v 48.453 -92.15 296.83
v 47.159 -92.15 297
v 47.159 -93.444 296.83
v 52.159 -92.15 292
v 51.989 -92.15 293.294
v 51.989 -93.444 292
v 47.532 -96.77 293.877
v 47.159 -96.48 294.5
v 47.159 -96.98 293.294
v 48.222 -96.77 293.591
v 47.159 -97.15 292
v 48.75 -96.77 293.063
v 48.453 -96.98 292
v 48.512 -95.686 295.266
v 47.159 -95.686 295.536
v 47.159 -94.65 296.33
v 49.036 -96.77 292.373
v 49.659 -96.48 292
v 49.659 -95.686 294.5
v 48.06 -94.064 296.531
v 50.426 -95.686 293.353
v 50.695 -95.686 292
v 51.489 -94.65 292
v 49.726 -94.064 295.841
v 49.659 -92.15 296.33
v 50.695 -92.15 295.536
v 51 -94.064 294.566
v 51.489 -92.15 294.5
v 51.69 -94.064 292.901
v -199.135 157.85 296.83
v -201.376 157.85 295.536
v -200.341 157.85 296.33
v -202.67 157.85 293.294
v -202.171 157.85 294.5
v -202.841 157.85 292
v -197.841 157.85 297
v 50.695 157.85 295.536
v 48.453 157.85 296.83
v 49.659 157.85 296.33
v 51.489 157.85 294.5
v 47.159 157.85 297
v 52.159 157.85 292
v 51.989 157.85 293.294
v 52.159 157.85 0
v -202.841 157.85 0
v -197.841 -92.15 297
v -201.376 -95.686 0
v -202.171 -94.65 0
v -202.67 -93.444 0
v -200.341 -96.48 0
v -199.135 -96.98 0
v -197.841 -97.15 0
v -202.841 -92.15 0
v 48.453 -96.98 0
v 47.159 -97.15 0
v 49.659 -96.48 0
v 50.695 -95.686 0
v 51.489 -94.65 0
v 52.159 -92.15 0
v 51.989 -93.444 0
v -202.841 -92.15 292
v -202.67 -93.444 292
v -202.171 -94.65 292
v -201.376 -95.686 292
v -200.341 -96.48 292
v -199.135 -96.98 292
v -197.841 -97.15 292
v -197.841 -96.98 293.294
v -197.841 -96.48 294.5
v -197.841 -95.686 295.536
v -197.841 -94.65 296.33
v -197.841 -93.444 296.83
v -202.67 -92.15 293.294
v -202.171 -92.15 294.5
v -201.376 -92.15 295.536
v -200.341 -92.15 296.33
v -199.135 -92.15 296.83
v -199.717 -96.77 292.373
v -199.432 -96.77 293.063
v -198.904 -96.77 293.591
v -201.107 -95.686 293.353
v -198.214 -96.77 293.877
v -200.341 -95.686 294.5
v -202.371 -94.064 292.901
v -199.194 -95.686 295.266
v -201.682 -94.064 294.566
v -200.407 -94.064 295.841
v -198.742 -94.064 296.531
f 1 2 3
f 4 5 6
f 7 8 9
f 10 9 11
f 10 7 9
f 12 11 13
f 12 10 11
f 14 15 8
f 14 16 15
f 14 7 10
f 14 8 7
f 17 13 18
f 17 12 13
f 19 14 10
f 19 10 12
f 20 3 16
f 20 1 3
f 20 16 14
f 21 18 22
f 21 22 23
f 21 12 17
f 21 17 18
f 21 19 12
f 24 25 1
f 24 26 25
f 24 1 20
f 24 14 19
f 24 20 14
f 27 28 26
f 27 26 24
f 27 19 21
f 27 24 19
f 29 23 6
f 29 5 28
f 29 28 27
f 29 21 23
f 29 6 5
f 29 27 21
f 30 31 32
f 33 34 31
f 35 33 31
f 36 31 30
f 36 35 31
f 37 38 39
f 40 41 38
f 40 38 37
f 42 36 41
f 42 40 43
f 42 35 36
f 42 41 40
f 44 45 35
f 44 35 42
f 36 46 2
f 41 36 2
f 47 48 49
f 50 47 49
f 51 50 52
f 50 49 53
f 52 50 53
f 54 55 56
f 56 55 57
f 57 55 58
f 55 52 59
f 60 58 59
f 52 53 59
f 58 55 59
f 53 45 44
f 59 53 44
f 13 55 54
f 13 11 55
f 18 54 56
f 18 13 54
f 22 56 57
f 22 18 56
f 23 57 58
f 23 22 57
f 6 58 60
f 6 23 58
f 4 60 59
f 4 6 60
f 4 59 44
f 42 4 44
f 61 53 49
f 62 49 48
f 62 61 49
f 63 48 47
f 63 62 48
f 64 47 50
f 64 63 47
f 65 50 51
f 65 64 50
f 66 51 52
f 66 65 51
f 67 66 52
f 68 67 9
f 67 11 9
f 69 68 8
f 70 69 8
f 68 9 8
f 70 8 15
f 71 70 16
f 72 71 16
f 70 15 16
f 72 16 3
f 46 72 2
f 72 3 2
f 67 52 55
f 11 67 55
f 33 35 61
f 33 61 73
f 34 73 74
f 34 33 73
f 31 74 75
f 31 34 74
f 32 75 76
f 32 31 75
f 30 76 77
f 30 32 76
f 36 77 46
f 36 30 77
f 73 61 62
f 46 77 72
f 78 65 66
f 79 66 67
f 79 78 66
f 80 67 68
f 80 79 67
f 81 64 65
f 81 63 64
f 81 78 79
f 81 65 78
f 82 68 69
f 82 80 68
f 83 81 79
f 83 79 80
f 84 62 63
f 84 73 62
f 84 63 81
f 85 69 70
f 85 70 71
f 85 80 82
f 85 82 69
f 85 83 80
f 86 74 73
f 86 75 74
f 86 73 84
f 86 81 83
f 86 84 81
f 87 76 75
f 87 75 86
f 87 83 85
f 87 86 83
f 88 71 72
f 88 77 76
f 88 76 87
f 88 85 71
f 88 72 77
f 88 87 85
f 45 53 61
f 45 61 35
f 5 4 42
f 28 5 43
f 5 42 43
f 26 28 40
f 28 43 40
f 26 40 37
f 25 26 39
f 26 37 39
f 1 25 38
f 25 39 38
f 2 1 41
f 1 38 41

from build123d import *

# Parameters (mm, degrees)
F0_W     = 255
F0_H     = 255
F1_DEPTH = 297
F2_R     = 5


with BuildPart() as f1:
    # F0 (on Top) → F1 (new body)
    with BuildSketch(Plane.XY):
        with Locations((-75.340826, 30.349805)):
            Rectangle(F0_W, F0_H)
    extrude(amount=F1_DEPTH)

    # F2
    f2_edges = [f1.edges().sort_by_distance(p)[0] for p in [
        (52.159174, 30.349805, 297),
        (-202.840826, 30.349805, 297),
        (-202.840826, -97.150195, 148.5),
        (-75.340826, -97.150195, 297),
        (52.159174, -97.150195, 148.5),
    ]]
    fillet(f2_edges, radius=F2_R)


solid = f1.part
